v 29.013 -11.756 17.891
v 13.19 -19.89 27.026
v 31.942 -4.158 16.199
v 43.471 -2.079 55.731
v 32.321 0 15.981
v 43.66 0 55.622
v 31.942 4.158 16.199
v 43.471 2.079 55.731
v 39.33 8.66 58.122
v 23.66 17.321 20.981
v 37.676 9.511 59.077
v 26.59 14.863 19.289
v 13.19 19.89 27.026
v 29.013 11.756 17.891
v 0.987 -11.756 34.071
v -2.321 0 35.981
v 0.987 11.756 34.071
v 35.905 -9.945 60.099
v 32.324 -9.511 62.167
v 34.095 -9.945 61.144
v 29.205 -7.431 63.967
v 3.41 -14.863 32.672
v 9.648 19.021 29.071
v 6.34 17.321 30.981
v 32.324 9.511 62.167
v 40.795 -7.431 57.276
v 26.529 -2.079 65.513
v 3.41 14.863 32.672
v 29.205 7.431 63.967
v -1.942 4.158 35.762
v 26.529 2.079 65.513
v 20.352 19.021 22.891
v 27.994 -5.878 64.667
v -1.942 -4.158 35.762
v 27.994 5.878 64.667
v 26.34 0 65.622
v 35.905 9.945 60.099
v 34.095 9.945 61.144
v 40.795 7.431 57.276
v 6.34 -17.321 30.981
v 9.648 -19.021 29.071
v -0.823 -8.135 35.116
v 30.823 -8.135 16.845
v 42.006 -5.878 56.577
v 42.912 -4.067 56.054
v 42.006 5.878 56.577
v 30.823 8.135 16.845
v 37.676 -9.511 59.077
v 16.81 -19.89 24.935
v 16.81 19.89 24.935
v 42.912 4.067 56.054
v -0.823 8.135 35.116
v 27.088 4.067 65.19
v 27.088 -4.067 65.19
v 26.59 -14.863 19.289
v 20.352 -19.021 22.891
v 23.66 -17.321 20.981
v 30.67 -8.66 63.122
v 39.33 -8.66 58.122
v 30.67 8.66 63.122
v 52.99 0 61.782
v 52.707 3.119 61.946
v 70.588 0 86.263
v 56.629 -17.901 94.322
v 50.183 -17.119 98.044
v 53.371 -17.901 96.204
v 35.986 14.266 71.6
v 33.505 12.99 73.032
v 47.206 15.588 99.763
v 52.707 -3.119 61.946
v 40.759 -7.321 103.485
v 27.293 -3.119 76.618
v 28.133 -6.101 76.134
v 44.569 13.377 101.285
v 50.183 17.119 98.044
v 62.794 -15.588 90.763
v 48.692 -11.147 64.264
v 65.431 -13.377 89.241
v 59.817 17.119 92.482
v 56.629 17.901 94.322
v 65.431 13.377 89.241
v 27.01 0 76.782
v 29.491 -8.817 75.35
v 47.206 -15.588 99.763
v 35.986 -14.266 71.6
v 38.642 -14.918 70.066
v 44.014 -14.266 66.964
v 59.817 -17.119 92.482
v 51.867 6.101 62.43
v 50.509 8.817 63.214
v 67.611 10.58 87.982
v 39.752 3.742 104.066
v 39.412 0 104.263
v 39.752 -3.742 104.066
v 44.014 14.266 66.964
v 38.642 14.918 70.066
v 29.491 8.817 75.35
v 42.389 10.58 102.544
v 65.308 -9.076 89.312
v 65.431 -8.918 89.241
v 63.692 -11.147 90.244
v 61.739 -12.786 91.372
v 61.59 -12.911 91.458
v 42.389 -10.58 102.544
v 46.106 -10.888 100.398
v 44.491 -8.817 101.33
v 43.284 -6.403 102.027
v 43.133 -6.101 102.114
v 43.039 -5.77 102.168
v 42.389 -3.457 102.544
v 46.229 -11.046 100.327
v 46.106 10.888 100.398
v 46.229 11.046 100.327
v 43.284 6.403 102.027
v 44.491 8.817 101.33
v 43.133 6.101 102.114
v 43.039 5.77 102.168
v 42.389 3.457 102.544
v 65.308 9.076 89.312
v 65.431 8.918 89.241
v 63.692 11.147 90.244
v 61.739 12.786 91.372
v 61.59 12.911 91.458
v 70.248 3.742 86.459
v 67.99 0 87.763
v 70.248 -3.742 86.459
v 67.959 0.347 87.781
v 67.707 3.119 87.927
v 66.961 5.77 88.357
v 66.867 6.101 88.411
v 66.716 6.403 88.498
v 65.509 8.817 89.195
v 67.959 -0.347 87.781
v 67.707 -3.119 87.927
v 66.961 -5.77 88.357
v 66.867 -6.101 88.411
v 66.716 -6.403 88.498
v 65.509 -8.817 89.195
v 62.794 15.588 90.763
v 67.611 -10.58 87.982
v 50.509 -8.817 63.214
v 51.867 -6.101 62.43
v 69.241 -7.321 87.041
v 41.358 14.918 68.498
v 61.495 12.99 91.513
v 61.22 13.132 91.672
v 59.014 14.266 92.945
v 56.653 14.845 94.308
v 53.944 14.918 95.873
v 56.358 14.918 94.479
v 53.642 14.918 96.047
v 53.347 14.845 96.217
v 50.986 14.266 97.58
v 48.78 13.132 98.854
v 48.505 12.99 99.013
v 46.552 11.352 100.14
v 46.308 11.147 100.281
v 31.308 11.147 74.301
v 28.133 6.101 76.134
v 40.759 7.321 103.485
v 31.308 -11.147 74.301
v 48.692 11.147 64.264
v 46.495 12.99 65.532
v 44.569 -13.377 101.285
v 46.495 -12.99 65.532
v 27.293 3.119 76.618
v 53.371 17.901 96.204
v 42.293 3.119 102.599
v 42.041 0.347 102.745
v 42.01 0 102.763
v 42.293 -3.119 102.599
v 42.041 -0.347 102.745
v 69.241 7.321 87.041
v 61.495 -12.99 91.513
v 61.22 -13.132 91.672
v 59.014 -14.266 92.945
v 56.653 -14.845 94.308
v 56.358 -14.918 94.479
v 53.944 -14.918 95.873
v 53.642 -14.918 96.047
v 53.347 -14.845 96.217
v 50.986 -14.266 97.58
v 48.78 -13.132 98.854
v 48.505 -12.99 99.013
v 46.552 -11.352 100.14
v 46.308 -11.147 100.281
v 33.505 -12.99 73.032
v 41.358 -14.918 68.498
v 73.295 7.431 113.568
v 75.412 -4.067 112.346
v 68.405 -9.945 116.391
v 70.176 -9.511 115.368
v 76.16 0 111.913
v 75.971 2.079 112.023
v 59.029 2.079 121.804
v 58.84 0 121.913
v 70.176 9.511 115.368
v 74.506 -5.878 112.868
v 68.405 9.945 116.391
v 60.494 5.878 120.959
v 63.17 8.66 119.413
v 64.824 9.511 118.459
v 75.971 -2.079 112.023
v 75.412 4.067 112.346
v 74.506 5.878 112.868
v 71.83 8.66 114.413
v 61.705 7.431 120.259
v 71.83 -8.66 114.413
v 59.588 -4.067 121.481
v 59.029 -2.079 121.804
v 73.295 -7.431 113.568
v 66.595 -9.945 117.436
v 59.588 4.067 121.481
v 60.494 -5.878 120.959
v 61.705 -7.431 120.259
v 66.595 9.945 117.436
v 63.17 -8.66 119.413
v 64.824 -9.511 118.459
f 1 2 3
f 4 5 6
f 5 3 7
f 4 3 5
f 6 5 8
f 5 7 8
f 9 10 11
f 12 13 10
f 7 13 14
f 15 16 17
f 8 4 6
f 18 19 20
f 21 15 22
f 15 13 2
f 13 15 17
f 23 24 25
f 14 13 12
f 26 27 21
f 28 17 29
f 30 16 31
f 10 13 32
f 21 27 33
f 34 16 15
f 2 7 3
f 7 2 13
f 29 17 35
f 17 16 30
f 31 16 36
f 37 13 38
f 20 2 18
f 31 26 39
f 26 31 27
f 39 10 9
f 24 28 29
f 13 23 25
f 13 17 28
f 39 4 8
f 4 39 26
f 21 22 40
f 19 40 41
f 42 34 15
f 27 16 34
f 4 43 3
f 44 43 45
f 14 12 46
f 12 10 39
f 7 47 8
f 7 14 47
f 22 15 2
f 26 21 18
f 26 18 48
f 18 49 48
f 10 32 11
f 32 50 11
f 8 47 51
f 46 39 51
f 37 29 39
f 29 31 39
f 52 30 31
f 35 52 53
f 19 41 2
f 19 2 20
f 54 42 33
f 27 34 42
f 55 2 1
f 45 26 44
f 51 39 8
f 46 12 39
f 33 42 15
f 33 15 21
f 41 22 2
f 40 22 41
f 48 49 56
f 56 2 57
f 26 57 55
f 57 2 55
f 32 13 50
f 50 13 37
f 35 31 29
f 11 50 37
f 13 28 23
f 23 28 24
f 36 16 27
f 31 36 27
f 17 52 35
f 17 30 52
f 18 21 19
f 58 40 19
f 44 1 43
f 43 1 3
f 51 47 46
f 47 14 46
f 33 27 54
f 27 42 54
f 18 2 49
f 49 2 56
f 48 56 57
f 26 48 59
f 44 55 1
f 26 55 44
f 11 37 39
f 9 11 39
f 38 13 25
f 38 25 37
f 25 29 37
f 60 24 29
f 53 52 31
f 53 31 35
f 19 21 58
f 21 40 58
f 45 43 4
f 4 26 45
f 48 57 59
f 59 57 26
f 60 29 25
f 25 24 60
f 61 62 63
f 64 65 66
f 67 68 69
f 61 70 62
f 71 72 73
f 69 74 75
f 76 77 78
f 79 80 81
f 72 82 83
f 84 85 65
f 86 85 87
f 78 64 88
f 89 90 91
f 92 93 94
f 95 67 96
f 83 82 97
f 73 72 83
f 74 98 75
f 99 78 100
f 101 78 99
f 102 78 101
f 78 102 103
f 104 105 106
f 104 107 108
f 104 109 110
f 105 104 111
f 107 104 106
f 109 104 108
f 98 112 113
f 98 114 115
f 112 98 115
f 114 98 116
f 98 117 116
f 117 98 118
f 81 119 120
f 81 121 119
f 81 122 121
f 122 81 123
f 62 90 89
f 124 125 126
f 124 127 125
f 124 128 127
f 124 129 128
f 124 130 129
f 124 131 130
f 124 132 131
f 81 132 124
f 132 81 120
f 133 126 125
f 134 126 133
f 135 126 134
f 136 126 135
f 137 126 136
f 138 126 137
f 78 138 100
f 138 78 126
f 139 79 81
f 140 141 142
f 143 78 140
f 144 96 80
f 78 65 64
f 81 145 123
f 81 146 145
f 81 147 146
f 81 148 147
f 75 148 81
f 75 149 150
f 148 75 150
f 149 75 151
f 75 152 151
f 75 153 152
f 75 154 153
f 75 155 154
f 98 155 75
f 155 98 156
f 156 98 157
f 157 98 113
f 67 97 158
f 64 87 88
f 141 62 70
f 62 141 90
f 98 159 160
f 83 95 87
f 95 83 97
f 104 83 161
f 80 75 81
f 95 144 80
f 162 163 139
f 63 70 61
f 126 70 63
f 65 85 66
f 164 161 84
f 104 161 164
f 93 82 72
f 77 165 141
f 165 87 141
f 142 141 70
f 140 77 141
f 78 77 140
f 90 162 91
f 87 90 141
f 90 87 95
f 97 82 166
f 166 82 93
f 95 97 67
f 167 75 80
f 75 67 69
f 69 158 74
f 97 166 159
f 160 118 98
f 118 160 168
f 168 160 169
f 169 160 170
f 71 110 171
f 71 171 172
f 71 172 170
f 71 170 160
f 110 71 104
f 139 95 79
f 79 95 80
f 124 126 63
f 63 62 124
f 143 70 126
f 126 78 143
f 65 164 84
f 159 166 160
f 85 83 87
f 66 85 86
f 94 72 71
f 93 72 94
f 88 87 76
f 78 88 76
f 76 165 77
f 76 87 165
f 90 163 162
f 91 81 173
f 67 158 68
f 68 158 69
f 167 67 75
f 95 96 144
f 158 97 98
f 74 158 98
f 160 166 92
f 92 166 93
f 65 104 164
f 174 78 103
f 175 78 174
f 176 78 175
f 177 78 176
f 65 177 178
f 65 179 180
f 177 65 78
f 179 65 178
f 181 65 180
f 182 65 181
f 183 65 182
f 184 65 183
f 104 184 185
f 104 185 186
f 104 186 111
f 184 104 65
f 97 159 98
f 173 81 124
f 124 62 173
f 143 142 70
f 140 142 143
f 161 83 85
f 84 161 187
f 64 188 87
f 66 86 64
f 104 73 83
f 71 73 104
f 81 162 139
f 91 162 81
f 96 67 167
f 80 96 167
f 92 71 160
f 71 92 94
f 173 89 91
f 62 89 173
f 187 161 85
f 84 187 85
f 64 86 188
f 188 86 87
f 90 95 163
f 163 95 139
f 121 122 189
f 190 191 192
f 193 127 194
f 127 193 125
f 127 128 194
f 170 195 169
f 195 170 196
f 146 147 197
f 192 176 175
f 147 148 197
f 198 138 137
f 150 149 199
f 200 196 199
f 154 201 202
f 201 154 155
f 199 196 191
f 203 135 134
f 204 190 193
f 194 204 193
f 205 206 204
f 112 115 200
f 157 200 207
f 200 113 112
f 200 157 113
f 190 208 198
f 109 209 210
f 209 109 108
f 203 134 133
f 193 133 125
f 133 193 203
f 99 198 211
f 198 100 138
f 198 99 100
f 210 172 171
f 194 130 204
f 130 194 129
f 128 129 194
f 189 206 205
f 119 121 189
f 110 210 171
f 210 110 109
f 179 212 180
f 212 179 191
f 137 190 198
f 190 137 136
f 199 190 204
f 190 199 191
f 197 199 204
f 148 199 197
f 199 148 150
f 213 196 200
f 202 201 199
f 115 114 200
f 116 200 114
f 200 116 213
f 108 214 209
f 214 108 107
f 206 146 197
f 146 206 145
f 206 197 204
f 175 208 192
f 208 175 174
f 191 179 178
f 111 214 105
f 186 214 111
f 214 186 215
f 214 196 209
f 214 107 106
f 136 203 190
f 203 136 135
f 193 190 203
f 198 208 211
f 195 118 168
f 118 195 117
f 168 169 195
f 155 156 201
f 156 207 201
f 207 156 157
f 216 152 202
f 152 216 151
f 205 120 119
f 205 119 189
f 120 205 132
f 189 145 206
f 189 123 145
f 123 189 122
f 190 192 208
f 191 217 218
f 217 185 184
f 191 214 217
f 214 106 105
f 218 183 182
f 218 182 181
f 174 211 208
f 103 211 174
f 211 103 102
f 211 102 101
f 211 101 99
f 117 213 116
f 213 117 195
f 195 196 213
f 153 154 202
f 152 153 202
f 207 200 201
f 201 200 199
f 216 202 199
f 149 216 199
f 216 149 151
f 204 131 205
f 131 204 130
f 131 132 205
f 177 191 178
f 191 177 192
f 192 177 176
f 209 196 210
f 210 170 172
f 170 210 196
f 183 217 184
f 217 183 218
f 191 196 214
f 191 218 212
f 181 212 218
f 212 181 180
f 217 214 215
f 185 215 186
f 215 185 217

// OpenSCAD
     rotate(30,[0,1,0]) translate([0,0,30]) cylinder(h=40,r1=20,r2=10, center = false);
     rotate(30,[0,1,0])	translate([0,0,80]) cylinder(h=30,r1=15,r2=18, center = false);
     rotate(30,[0,1,0])	translate([0,0,105]) cylinder(h=30,r1=16,r2=10, center = false);    
